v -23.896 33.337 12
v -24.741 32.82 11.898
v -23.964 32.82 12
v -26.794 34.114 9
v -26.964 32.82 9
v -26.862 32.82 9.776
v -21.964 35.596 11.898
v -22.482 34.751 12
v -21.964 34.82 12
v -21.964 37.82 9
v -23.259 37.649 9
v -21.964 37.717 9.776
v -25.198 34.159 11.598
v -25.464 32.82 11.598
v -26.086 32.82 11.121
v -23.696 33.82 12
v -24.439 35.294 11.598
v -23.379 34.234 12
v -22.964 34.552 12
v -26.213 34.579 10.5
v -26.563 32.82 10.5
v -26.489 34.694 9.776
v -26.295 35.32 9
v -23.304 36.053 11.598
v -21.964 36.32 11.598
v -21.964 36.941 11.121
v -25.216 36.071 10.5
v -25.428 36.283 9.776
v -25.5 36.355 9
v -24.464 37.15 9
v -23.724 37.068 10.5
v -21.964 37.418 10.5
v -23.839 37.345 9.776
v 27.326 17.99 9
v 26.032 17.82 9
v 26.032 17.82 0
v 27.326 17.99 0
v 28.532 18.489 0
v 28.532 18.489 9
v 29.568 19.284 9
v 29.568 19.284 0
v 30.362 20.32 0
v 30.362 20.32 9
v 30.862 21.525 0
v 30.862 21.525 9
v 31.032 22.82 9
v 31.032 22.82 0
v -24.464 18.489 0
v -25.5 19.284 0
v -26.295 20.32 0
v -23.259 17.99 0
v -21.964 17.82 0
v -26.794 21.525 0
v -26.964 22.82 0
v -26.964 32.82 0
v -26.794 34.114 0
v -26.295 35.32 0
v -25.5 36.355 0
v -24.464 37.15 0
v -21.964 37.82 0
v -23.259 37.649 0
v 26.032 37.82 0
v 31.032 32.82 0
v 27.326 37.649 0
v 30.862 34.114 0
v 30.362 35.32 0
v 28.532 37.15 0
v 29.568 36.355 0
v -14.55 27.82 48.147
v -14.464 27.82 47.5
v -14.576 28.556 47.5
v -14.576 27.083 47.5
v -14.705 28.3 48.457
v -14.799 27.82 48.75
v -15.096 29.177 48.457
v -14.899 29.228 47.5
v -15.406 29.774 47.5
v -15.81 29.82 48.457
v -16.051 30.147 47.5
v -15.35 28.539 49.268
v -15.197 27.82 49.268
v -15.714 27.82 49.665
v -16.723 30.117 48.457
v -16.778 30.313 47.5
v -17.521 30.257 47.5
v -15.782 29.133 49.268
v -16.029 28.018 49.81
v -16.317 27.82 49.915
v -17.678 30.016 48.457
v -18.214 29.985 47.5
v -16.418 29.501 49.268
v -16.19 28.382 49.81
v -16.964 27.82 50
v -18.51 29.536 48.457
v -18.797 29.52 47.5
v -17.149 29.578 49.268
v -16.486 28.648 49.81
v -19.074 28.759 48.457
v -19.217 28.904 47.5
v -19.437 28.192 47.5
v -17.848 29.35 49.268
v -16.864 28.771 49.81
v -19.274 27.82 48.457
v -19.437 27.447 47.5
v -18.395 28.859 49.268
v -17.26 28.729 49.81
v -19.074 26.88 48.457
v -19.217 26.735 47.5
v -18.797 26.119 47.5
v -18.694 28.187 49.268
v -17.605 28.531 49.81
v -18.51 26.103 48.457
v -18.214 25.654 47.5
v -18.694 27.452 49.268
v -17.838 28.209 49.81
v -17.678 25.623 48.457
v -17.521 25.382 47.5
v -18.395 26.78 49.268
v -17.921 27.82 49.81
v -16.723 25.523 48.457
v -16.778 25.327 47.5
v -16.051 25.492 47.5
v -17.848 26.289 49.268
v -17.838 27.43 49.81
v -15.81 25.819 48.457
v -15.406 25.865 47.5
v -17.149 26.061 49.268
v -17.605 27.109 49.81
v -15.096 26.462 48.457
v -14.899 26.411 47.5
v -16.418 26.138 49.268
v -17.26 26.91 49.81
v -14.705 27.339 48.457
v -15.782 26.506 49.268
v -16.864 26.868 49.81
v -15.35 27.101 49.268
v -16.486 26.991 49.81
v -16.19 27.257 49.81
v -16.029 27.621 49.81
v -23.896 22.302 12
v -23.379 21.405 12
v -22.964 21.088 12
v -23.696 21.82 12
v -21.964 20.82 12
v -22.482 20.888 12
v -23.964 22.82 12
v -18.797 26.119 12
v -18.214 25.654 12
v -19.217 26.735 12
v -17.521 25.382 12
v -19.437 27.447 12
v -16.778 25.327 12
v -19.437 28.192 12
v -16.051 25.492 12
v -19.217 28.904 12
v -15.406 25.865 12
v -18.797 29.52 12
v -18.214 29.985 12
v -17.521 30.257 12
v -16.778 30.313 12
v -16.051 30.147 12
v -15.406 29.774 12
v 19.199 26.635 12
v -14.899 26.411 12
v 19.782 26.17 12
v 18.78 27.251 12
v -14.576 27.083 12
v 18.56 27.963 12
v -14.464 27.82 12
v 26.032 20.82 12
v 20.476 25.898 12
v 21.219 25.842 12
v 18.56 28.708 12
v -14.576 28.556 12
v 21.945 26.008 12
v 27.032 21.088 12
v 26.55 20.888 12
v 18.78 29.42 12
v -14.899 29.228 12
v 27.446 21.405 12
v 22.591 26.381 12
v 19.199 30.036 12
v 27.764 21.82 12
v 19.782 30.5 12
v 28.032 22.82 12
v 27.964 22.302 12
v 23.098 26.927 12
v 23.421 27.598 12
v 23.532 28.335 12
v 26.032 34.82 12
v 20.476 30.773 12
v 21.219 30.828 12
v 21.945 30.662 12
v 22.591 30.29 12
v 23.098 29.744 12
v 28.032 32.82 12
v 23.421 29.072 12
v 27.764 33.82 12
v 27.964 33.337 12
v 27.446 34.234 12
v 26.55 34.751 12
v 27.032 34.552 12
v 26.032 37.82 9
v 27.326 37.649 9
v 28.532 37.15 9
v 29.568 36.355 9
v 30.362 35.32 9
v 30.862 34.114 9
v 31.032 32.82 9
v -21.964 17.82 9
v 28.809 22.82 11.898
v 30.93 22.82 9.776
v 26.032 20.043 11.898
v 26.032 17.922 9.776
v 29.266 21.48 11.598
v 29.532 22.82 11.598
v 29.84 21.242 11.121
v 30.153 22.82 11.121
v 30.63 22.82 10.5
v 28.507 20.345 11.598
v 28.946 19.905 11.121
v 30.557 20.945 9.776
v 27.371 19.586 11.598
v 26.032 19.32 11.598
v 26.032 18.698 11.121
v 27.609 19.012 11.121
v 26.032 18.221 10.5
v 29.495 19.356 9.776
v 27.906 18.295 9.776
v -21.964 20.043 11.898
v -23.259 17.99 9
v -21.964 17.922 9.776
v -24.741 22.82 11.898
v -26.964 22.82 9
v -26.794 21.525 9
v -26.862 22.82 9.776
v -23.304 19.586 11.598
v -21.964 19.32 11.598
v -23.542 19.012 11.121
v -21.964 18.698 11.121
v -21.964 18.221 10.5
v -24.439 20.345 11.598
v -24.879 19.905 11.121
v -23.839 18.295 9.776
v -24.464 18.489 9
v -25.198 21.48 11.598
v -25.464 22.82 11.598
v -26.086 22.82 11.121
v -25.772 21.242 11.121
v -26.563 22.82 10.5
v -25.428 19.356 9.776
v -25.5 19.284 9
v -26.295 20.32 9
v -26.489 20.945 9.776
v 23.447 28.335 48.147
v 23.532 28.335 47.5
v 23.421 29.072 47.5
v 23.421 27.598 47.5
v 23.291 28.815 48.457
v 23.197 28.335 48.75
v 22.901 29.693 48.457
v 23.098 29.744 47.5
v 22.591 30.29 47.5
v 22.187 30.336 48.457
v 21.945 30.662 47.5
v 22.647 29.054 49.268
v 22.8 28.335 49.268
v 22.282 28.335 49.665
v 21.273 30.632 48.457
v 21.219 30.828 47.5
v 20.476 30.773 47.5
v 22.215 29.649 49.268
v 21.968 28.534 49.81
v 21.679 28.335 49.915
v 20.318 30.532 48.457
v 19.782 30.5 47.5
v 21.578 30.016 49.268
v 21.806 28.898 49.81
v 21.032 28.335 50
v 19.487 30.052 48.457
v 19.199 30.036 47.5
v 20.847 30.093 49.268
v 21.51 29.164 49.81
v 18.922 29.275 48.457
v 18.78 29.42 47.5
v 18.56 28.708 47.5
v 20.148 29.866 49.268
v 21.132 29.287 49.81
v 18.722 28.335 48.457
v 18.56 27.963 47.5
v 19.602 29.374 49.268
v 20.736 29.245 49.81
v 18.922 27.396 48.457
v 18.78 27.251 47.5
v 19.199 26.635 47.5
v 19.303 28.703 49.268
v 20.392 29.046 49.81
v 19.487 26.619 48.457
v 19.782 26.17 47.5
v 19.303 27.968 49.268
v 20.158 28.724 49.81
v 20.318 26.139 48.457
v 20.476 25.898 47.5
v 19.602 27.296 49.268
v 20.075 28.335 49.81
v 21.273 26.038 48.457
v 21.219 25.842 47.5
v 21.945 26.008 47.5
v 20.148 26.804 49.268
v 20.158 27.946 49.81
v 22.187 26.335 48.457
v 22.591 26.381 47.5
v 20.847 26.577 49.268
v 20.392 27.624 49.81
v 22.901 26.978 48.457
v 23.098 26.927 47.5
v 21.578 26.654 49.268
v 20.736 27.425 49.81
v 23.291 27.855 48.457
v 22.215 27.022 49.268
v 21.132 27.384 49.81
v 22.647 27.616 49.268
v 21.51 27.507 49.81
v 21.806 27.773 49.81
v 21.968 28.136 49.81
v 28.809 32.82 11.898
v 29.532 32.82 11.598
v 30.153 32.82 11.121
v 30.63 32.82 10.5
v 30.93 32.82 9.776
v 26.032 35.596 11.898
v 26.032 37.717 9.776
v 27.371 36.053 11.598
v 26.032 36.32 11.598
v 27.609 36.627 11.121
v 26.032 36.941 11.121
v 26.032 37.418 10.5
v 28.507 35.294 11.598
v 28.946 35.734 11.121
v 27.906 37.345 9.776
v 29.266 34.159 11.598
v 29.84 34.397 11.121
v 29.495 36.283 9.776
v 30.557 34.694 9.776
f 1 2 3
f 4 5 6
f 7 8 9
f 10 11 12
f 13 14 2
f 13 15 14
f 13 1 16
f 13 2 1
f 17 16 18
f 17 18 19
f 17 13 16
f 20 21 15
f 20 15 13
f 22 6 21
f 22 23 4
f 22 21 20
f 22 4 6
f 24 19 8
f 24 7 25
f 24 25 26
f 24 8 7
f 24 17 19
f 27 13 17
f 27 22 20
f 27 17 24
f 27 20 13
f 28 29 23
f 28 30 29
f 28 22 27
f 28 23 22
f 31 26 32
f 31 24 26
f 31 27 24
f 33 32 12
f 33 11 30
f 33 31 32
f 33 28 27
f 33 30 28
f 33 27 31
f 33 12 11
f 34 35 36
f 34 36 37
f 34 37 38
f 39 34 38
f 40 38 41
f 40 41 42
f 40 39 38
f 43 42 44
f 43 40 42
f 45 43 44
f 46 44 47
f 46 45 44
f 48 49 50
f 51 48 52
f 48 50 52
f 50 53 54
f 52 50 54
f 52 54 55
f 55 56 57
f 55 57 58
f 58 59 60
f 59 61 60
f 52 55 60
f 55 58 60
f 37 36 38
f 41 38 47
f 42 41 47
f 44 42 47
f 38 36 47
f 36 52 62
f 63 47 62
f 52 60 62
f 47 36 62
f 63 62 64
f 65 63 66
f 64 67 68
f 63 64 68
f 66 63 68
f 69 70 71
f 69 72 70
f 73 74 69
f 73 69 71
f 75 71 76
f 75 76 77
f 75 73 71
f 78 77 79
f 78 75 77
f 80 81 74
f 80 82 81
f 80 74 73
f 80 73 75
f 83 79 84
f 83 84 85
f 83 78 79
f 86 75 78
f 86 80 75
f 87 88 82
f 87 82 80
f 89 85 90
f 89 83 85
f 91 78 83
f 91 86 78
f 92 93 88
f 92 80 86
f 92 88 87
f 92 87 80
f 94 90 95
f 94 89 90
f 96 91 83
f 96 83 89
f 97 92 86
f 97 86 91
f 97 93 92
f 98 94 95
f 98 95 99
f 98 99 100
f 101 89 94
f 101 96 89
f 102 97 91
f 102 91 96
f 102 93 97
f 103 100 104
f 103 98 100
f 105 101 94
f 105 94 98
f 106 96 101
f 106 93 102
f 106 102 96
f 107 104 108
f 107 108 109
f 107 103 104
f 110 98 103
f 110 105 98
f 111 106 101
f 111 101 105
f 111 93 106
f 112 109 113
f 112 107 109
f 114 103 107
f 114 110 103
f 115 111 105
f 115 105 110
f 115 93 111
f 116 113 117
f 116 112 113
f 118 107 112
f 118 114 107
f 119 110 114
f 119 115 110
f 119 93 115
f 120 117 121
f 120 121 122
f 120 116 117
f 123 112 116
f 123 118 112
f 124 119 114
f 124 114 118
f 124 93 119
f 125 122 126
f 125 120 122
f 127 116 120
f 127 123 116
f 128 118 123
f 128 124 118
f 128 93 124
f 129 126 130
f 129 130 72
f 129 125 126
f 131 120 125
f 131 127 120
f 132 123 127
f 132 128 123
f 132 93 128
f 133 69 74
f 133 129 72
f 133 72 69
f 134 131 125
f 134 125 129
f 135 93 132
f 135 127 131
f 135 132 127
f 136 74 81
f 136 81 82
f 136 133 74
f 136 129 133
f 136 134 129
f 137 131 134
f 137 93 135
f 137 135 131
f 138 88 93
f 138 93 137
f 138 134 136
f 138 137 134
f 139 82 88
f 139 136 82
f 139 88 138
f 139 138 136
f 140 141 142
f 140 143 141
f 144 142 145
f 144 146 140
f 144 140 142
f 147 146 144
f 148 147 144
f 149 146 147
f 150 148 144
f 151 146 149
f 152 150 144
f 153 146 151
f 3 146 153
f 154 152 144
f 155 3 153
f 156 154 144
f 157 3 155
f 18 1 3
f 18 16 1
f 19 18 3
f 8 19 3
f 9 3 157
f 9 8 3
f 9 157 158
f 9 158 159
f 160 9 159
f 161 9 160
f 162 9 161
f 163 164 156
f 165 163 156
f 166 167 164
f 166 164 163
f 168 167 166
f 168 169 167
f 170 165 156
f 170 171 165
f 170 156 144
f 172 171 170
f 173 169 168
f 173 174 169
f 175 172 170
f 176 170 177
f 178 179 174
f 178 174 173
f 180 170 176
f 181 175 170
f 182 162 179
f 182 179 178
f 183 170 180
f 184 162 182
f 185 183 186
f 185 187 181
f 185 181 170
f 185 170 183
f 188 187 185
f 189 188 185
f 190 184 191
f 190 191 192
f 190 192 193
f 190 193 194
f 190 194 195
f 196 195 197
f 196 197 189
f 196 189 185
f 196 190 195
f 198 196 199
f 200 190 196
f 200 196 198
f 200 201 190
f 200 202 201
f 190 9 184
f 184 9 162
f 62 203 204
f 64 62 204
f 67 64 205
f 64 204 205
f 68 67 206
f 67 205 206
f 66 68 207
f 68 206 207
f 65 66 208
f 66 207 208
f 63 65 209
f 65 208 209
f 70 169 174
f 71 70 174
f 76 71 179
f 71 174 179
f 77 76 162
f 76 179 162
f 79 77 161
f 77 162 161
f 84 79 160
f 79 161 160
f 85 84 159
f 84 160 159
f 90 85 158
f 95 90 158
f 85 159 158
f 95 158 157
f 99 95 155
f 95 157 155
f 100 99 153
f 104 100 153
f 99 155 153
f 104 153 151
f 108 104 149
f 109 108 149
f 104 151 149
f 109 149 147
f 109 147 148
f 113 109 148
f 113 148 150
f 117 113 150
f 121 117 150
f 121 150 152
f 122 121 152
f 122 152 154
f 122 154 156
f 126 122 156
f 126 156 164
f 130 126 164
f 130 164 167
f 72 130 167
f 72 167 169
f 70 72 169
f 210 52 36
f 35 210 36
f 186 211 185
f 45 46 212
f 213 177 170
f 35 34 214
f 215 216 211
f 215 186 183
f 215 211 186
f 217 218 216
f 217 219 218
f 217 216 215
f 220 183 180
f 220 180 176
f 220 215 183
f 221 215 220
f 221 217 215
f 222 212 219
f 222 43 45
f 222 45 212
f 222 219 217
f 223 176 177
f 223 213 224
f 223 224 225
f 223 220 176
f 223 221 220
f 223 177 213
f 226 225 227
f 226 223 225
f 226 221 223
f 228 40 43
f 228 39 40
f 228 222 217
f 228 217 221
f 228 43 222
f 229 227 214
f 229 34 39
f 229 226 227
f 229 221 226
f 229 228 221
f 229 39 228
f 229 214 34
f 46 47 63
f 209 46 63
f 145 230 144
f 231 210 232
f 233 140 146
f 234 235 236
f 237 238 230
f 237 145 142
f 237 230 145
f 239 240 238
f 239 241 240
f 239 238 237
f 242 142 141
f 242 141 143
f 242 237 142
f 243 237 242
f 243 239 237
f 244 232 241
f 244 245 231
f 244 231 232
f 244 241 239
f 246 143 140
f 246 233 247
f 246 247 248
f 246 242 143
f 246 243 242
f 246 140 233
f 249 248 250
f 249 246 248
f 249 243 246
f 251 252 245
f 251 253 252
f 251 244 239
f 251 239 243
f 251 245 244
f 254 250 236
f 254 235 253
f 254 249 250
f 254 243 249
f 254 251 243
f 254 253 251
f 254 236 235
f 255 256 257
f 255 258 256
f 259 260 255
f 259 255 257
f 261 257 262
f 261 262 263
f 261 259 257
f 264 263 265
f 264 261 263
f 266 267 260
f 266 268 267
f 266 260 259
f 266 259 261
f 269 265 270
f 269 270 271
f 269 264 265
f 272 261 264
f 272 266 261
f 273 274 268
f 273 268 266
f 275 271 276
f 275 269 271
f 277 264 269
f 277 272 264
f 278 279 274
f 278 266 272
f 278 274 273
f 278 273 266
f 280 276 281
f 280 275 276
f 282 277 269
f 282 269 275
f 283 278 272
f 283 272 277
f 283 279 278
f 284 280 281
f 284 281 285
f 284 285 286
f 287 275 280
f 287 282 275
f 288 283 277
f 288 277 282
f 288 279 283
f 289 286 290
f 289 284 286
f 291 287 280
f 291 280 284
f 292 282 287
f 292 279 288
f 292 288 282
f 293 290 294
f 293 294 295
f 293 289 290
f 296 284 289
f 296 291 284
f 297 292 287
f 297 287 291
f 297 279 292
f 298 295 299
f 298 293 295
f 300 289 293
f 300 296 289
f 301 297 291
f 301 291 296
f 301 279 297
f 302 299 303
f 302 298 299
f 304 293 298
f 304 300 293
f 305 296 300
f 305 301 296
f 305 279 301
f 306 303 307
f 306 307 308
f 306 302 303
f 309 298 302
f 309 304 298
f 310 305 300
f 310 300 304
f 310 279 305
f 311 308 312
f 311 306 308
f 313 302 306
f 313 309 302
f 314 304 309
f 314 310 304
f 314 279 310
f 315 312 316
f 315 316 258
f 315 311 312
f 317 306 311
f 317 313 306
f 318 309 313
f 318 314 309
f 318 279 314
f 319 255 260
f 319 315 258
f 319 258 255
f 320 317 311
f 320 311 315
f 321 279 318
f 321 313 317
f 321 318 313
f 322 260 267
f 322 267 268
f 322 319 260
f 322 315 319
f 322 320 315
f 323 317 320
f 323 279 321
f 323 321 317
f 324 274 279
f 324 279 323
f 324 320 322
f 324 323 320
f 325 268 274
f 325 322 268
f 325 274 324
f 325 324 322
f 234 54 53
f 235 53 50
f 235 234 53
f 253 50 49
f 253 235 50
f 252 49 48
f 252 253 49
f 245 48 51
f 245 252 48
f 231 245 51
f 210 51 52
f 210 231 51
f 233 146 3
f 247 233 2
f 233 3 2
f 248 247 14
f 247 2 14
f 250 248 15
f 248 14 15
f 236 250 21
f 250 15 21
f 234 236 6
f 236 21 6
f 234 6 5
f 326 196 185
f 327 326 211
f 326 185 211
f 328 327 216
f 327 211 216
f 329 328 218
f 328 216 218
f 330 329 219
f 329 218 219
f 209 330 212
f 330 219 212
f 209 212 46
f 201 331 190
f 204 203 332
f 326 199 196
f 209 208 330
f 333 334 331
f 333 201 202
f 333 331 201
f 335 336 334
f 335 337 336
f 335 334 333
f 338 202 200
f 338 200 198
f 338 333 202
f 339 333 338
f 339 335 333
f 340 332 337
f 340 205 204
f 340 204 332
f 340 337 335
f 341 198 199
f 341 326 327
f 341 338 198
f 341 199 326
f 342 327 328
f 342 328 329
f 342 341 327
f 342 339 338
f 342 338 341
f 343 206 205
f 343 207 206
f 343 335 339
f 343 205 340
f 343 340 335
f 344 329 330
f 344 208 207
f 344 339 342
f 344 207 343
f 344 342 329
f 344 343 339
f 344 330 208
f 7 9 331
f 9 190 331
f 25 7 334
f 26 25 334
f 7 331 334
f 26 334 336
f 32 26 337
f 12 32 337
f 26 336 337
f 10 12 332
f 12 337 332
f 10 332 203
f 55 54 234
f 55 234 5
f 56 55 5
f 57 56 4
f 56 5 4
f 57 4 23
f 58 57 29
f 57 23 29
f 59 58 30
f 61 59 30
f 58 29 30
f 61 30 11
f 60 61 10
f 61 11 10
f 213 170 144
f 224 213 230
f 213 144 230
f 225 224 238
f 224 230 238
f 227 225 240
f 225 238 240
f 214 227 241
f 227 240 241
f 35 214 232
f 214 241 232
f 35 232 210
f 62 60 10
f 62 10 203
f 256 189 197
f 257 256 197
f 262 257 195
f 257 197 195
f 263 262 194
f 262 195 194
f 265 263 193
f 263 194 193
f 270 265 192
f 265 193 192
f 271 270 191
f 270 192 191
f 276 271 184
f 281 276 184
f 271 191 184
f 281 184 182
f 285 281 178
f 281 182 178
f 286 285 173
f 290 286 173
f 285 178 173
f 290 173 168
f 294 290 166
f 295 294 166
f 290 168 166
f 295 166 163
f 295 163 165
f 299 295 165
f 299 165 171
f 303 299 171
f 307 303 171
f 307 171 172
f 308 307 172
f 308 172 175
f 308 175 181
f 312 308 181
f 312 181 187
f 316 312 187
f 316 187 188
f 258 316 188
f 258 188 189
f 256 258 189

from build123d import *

# Parameters (mm, degrees)
F0_W     = 57.996501
F0_H     = 20
F0_R     = 2.5
F1_DEPTH = 12
F2_DEPTH = 50
F3_R     = 2.5
F4_R     = 5
F5_R     = 3


with BuildPart() as f1:
    # F0 (on Top) → F1 (new body)
    with BuildSketch(Plane.XY):
        with Locations((2.033807, 27.819562)):
            Rectangle(F0_W, F0_H)
        with Locations((-16.964443, 27.819562)):
            Circle(F0_R, mode=Mode.SUBTRACT)
        with Locations((21.032058, 28.33525)):
            Circle(F0_R, mode=Mode.SUBTRACT)
        with Locations((-16.964443, 27.819562)):
            Circle(F0_R)
        with Locations((21.032058, 28.33525)):
            Circle(F0_R)
    extrude(amount=F1_DEPTH)

    # F0 (on Top) → F2 (join)
    with BuildSketch(Plane.XY):
        with Locations((-16.964443, 27.819562)):
            Circle(F0_R)
        with Locations((21.032058, 28.33525)):
            Circle(F0_R)
    extrude(amount=F2_DEPTH)

    # F3
    f3_edges = [f1.edges().sort_by_distance(p)[0] for p in [
        (-19.464443, 27.819562, 50),
        (18.532058, 28.33525, 50),
    ]]
    fillet(f3_edges, radius=F3_R)

    # F4
    f4_edges = [f1.edges().sort_by_distance(p)[0] for p in [
        (-26.964443, 37.819562, 6),
        (-26.964443, 17.819562, 6),
        (31.032058, 17.819562, 6),
        (31.032058, 37.819562, 6),
    ]]
    fillet(f4_edges, radius=F4_R)

    # F5
    f5_edges = [f1.edges().sort_by_distance(p)[0] for p in [
        (2.033808, 37.819562, 12),
    ]]
    fillet(f5_edges, radius=F5_R)


solid = f1.part
